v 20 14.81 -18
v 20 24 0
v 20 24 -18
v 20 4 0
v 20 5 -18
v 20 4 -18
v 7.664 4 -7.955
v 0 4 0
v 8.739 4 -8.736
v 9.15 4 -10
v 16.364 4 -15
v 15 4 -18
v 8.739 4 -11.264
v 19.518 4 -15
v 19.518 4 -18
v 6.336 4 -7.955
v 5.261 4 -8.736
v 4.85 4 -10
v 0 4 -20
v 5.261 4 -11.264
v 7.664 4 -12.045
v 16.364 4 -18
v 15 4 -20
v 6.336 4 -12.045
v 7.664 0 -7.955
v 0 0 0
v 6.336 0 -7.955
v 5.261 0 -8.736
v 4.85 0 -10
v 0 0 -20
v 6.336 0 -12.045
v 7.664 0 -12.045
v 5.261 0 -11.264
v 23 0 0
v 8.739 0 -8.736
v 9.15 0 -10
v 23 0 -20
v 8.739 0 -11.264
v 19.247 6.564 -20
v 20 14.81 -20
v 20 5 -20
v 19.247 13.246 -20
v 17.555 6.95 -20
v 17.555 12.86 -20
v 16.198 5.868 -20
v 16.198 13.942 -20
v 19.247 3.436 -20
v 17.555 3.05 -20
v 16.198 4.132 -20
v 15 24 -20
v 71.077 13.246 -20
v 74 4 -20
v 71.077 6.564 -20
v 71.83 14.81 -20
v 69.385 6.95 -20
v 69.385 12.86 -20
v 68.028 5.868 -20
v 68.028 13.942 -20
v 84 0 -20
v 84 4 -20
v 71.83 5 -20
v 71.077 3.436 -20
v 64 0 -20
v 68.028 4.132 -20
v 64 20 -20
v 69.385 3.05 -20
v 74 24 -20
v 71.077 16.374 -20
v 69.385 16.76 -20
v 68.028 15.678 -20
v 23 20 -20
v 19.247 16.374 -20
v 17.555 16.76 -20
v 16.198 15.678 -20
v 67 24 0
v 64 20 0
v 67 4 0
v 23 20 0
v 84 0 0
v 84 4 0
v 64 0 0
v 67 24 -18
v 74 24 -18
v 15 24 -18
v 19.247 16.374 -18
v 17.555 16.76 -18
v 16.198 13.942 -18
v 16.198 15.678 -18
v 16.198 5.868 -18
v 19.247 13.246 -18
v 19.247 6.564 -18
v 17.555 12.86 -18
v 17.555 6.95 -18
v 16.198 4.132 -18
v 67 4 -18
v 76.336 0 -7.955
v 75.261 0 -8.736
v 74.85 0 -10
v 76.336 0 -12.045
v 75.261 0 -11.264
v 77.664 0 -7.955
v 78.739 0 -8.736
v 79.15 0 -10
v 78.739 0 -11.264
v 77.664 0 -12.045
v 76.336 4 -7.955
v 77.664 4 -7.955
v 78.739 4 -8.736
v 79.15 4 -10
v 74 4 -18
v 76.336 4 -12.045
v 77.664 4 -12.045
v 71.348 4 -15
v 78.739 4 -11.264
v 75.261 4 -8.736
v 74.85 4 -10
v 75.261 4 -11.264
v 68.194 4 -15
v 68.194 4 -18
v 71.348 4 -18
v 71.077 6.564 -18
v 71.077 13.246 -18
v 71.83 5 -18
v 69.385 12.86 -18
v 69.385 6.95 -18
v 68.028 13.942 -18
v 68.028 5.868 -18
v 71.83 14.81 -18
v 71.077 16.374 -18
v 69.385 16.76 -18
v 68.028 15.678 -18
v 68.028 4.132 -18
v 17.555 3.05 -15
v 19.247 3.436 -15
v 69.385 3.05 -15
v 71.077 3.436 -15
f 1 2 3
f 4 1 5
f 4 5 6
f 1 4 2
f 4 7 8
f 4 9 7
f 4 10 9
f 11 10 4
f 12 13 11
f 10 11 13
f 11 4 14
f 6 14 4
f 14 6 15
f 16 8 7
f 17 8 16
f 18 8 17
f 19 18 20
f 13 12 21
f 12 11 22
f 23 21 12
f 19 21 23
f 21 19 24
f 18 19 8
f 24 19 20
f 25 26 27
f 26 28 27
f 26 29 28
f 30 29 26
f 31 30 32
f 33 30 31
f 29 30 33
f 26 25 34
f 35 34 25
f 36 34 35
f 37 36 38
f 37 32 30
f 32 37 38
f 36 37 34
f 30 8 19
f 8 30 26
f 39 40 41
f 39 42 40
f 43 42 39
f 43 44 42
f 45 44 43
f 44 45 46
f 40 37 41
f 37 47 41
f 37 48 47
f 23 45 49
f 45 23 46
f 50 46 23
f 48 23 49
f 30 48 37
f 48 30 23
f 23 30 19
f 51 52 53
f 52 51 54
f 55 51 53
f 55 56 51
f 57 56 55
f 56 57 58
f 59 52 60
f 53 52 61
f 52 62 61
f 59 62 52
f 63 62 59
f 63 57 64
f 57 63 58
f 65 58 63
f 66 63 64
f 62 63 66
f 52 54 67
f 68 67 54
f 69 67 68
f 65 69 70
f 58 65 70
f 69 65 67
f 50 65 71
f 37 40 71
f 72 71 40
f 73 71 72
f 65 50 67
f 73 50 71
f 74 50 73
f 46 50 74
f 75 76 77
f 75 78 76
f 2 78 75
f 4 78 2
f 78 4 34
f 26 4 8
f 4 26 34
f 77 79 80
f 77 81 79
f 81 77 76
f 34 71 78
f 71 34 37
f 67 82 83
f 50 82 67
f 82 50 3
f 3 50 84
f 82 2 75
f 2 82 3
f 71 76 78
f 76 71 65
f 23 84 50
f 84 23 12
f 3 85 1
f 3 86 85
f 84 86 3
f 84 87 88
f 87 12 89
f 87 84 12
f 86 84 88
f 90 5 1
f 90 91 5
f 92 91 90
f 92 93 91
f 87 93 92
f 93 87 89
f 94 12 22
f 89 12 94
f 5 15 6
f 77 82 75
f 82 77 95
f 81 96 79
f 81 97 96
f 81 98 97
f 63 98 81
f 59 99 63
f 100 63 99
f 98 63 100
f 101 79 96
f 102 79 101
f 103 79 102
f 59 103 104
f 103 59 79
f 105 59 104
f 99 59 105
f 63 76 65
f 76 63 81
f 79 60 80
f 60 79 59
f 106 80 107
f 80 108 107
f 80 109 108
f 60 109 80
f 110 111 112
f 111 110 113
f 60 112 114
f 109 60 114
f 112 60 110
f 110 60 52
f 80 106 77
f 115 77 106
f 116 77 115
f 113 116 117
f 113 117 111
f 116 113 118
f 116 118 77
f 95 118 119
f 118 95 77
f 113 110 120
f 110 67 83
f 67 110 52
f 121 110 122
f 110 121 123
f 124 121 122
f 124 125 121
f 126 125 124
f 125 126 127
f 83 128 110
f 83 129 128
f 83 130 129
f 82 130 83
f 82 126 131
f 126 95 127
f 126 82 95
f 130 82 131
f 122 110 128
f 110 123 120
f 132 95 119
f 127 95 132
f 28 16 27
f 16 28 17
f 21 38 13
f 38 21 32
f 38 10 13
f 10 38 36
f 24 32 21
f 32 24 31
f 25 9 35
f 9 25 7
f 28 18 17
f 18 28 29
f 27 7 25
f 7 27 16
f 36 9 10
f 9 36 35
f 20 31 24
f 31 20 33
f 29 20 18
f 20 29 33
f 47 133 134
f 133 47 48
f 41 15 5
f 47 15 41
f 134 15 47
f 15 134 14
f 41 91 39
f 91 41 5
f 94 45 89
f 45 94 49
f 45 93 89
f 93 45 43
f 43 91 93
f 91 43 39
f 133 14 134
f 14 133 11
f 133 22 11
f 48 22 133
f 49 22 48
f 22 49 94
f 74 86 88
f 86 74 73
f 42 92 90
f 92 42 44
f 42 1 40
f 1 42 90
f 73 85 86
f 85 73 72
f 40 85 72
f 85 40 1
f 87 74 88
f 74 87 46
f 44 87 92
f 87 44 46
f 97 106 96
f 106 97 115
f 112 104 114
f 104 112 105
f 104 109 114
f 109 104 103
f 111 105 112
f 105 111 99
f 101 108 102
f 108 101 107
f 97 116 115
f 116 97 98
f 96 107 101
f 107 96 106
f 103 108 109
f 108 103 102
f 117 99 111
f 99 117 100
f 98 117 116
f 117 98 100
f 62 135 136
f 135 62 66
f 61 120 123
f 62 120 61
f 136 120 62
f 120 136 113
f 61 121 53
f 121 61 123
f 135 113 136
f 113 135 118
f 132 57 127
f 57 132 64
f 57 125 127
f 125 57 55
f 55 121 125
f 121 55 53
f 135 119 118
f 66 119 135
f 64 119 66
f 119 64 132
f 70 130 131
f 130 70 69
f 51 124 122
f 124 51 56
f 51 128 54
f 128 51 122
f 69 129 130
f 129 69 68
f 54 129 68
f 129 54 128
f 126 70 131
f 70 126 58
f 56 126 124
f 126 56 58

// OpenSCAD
// file: bbs_constants.scad
//
// This is a collection of constants that are often needed in various models.
//
// Use functions for constants that should be exported
//
// Sizes for the mini rack
//
function bbs_mini_rack_width() = 72;
function bbs_mini_rack_length() = 100;
//
// Sizes for the standard size rack
//
function bbs_std_rack_width() = 161;
function bbs_std_rack_length() = 200;
//
// Sizes for screw holes.  These are composed of the measured diameter plus a little "fudge factor" to be
// determined.  This is necessary since the printer makes holes a little smaller than they should be
// and to provide a little clearance.
//
function screw_2_size() = 2.10 + 0.25;
function screw_4_size() = 2.80 + 0.15;
function screw_6_size() = 3.38 + 0.3;
function screw_8_size() = 4.06 + 0.3;
function screw_m4_size() = 3.90 + 0.4;
// main file
//
// This file contains a set of models for working with small servo motors.
//
use <bbs_constants.scad>
//--------------------------------
//
//
// Model for a SG-5010 servo
//
module bbs_sg5010()
{
    mount_rad=3.46/2;
    difference()
    {
        union()
        {
            cube([40.72, 20.5, 38]);
            translate([-6.69, 7.08, 2.4]) cube([6.7, 7.72, 4.5]);
            translate([-7.5, 0, 27.86]) cube([54.70, 20.5, 2.54]);
        }
        union()
        {
            translate([-(3.10+mount_rad), 2.95+mount_rad, 20]) cylinder(r=mount_rad,h=40);
            translate([-(3.10+mount_rad), 12.81+mount_rad, 20]) cylinder(r=mount_rad,h=40);
            translate([42.83+mount_rad, 2.95+mount_rad, 20]) cylinder(r=mount_rad,h=40);
            translate([42.83+mount_rad, 12.81+mount_rad, 20]) cylinder(r=mount_rad,h=40);
        }
    }
}
//
// Clips for SG-5010 servo.  One is a full clip and the other two are half clips.
//
module bbs_sg5010_clip_l()
{
    mount_rad=4.0/2;
    difference()
    {
        union()
        {
            cube([20, 20, 4]);
            translate([20, 0, 0]) cube([3, 20, 20 + 4]);
            translate([23, 0, 20]) cube([16, 20, 4]);
            translate([15, 18, 4]) cube([7, 2, 20]);
        }
        union()
        {
            translate([10, 10, -0.1]) cylinder(r=screw_m4_size()/2, h=4.2, $fn=10);
            translate([20-mount_rad, 15, 3+mount_rad]) rotate([-90, 0, 0]) cylinder(r=mount_rad,h=10);
            translate([20-mount_rad, 15, 12.81+mount_rad]) rotate([-90, 0, 0]) cylinder(r=mount_rad,h=10);
        }
    }
}
//
module bbs_sg5010_clip_r()
{
    scale([-1,1,1]) bbs_sg5010_clip_l();
}
//
module bbs_sg5010_clip()
{
    mount_rad=4.0/2;
    difference()
    {
        union()
        {
            cube([20, 20, 4]);
            translate([20, 0, 0]) cube([3, 20, 20 + 4]);
            translate([23, 0, 20]) cube([42, 20, 4]);
            translate([15, 18, 4]) cube([7, 2, 20]);
//
            translate([64, 0, 0]) cube([3, 20, 20 + 4]);
            translate([64, 0, 0]) cube([20, 20, 4]);
            translate([67, 18, 4]) cube([7, 2, 20]);
        }
        union()
        {
            translate([7, 10, -0.1]) cylinder(r=screw_m4_size()/2, h=4.2, $fn=10);
            translate([20-mount_rad, 15, 3+mount_rad]) rotate([-90, 0, 0]) cylinder(r=mount_rad,h=10);
            translate([20-mount_rad, 15, 12.81+mount_rad]) rotate([-90, 0, 0]) cylinder(r=mount_rad,h=10);
//
            translate([77, 10, -0.1]) cylinder(r=screw_m4_size()/2, h=4.2, $fn=10);
            translate([67.83+mount_rad, 15, 3+mount_rad]) rotate([-90, 0, 0]) cylinder(r=mount_rad,h=10);
            translate([67.83+mount_rad, 15, 12.81+mount_rad]) rotate([-90, 0, 0]) cylinder(r=mount_rad,h=10);
        }
    }
}


//translate([24, 0, -28]) color("blue") bbs_sg5010();
rotate([-90, 0, 0]) bbs_sg5010_clip();
